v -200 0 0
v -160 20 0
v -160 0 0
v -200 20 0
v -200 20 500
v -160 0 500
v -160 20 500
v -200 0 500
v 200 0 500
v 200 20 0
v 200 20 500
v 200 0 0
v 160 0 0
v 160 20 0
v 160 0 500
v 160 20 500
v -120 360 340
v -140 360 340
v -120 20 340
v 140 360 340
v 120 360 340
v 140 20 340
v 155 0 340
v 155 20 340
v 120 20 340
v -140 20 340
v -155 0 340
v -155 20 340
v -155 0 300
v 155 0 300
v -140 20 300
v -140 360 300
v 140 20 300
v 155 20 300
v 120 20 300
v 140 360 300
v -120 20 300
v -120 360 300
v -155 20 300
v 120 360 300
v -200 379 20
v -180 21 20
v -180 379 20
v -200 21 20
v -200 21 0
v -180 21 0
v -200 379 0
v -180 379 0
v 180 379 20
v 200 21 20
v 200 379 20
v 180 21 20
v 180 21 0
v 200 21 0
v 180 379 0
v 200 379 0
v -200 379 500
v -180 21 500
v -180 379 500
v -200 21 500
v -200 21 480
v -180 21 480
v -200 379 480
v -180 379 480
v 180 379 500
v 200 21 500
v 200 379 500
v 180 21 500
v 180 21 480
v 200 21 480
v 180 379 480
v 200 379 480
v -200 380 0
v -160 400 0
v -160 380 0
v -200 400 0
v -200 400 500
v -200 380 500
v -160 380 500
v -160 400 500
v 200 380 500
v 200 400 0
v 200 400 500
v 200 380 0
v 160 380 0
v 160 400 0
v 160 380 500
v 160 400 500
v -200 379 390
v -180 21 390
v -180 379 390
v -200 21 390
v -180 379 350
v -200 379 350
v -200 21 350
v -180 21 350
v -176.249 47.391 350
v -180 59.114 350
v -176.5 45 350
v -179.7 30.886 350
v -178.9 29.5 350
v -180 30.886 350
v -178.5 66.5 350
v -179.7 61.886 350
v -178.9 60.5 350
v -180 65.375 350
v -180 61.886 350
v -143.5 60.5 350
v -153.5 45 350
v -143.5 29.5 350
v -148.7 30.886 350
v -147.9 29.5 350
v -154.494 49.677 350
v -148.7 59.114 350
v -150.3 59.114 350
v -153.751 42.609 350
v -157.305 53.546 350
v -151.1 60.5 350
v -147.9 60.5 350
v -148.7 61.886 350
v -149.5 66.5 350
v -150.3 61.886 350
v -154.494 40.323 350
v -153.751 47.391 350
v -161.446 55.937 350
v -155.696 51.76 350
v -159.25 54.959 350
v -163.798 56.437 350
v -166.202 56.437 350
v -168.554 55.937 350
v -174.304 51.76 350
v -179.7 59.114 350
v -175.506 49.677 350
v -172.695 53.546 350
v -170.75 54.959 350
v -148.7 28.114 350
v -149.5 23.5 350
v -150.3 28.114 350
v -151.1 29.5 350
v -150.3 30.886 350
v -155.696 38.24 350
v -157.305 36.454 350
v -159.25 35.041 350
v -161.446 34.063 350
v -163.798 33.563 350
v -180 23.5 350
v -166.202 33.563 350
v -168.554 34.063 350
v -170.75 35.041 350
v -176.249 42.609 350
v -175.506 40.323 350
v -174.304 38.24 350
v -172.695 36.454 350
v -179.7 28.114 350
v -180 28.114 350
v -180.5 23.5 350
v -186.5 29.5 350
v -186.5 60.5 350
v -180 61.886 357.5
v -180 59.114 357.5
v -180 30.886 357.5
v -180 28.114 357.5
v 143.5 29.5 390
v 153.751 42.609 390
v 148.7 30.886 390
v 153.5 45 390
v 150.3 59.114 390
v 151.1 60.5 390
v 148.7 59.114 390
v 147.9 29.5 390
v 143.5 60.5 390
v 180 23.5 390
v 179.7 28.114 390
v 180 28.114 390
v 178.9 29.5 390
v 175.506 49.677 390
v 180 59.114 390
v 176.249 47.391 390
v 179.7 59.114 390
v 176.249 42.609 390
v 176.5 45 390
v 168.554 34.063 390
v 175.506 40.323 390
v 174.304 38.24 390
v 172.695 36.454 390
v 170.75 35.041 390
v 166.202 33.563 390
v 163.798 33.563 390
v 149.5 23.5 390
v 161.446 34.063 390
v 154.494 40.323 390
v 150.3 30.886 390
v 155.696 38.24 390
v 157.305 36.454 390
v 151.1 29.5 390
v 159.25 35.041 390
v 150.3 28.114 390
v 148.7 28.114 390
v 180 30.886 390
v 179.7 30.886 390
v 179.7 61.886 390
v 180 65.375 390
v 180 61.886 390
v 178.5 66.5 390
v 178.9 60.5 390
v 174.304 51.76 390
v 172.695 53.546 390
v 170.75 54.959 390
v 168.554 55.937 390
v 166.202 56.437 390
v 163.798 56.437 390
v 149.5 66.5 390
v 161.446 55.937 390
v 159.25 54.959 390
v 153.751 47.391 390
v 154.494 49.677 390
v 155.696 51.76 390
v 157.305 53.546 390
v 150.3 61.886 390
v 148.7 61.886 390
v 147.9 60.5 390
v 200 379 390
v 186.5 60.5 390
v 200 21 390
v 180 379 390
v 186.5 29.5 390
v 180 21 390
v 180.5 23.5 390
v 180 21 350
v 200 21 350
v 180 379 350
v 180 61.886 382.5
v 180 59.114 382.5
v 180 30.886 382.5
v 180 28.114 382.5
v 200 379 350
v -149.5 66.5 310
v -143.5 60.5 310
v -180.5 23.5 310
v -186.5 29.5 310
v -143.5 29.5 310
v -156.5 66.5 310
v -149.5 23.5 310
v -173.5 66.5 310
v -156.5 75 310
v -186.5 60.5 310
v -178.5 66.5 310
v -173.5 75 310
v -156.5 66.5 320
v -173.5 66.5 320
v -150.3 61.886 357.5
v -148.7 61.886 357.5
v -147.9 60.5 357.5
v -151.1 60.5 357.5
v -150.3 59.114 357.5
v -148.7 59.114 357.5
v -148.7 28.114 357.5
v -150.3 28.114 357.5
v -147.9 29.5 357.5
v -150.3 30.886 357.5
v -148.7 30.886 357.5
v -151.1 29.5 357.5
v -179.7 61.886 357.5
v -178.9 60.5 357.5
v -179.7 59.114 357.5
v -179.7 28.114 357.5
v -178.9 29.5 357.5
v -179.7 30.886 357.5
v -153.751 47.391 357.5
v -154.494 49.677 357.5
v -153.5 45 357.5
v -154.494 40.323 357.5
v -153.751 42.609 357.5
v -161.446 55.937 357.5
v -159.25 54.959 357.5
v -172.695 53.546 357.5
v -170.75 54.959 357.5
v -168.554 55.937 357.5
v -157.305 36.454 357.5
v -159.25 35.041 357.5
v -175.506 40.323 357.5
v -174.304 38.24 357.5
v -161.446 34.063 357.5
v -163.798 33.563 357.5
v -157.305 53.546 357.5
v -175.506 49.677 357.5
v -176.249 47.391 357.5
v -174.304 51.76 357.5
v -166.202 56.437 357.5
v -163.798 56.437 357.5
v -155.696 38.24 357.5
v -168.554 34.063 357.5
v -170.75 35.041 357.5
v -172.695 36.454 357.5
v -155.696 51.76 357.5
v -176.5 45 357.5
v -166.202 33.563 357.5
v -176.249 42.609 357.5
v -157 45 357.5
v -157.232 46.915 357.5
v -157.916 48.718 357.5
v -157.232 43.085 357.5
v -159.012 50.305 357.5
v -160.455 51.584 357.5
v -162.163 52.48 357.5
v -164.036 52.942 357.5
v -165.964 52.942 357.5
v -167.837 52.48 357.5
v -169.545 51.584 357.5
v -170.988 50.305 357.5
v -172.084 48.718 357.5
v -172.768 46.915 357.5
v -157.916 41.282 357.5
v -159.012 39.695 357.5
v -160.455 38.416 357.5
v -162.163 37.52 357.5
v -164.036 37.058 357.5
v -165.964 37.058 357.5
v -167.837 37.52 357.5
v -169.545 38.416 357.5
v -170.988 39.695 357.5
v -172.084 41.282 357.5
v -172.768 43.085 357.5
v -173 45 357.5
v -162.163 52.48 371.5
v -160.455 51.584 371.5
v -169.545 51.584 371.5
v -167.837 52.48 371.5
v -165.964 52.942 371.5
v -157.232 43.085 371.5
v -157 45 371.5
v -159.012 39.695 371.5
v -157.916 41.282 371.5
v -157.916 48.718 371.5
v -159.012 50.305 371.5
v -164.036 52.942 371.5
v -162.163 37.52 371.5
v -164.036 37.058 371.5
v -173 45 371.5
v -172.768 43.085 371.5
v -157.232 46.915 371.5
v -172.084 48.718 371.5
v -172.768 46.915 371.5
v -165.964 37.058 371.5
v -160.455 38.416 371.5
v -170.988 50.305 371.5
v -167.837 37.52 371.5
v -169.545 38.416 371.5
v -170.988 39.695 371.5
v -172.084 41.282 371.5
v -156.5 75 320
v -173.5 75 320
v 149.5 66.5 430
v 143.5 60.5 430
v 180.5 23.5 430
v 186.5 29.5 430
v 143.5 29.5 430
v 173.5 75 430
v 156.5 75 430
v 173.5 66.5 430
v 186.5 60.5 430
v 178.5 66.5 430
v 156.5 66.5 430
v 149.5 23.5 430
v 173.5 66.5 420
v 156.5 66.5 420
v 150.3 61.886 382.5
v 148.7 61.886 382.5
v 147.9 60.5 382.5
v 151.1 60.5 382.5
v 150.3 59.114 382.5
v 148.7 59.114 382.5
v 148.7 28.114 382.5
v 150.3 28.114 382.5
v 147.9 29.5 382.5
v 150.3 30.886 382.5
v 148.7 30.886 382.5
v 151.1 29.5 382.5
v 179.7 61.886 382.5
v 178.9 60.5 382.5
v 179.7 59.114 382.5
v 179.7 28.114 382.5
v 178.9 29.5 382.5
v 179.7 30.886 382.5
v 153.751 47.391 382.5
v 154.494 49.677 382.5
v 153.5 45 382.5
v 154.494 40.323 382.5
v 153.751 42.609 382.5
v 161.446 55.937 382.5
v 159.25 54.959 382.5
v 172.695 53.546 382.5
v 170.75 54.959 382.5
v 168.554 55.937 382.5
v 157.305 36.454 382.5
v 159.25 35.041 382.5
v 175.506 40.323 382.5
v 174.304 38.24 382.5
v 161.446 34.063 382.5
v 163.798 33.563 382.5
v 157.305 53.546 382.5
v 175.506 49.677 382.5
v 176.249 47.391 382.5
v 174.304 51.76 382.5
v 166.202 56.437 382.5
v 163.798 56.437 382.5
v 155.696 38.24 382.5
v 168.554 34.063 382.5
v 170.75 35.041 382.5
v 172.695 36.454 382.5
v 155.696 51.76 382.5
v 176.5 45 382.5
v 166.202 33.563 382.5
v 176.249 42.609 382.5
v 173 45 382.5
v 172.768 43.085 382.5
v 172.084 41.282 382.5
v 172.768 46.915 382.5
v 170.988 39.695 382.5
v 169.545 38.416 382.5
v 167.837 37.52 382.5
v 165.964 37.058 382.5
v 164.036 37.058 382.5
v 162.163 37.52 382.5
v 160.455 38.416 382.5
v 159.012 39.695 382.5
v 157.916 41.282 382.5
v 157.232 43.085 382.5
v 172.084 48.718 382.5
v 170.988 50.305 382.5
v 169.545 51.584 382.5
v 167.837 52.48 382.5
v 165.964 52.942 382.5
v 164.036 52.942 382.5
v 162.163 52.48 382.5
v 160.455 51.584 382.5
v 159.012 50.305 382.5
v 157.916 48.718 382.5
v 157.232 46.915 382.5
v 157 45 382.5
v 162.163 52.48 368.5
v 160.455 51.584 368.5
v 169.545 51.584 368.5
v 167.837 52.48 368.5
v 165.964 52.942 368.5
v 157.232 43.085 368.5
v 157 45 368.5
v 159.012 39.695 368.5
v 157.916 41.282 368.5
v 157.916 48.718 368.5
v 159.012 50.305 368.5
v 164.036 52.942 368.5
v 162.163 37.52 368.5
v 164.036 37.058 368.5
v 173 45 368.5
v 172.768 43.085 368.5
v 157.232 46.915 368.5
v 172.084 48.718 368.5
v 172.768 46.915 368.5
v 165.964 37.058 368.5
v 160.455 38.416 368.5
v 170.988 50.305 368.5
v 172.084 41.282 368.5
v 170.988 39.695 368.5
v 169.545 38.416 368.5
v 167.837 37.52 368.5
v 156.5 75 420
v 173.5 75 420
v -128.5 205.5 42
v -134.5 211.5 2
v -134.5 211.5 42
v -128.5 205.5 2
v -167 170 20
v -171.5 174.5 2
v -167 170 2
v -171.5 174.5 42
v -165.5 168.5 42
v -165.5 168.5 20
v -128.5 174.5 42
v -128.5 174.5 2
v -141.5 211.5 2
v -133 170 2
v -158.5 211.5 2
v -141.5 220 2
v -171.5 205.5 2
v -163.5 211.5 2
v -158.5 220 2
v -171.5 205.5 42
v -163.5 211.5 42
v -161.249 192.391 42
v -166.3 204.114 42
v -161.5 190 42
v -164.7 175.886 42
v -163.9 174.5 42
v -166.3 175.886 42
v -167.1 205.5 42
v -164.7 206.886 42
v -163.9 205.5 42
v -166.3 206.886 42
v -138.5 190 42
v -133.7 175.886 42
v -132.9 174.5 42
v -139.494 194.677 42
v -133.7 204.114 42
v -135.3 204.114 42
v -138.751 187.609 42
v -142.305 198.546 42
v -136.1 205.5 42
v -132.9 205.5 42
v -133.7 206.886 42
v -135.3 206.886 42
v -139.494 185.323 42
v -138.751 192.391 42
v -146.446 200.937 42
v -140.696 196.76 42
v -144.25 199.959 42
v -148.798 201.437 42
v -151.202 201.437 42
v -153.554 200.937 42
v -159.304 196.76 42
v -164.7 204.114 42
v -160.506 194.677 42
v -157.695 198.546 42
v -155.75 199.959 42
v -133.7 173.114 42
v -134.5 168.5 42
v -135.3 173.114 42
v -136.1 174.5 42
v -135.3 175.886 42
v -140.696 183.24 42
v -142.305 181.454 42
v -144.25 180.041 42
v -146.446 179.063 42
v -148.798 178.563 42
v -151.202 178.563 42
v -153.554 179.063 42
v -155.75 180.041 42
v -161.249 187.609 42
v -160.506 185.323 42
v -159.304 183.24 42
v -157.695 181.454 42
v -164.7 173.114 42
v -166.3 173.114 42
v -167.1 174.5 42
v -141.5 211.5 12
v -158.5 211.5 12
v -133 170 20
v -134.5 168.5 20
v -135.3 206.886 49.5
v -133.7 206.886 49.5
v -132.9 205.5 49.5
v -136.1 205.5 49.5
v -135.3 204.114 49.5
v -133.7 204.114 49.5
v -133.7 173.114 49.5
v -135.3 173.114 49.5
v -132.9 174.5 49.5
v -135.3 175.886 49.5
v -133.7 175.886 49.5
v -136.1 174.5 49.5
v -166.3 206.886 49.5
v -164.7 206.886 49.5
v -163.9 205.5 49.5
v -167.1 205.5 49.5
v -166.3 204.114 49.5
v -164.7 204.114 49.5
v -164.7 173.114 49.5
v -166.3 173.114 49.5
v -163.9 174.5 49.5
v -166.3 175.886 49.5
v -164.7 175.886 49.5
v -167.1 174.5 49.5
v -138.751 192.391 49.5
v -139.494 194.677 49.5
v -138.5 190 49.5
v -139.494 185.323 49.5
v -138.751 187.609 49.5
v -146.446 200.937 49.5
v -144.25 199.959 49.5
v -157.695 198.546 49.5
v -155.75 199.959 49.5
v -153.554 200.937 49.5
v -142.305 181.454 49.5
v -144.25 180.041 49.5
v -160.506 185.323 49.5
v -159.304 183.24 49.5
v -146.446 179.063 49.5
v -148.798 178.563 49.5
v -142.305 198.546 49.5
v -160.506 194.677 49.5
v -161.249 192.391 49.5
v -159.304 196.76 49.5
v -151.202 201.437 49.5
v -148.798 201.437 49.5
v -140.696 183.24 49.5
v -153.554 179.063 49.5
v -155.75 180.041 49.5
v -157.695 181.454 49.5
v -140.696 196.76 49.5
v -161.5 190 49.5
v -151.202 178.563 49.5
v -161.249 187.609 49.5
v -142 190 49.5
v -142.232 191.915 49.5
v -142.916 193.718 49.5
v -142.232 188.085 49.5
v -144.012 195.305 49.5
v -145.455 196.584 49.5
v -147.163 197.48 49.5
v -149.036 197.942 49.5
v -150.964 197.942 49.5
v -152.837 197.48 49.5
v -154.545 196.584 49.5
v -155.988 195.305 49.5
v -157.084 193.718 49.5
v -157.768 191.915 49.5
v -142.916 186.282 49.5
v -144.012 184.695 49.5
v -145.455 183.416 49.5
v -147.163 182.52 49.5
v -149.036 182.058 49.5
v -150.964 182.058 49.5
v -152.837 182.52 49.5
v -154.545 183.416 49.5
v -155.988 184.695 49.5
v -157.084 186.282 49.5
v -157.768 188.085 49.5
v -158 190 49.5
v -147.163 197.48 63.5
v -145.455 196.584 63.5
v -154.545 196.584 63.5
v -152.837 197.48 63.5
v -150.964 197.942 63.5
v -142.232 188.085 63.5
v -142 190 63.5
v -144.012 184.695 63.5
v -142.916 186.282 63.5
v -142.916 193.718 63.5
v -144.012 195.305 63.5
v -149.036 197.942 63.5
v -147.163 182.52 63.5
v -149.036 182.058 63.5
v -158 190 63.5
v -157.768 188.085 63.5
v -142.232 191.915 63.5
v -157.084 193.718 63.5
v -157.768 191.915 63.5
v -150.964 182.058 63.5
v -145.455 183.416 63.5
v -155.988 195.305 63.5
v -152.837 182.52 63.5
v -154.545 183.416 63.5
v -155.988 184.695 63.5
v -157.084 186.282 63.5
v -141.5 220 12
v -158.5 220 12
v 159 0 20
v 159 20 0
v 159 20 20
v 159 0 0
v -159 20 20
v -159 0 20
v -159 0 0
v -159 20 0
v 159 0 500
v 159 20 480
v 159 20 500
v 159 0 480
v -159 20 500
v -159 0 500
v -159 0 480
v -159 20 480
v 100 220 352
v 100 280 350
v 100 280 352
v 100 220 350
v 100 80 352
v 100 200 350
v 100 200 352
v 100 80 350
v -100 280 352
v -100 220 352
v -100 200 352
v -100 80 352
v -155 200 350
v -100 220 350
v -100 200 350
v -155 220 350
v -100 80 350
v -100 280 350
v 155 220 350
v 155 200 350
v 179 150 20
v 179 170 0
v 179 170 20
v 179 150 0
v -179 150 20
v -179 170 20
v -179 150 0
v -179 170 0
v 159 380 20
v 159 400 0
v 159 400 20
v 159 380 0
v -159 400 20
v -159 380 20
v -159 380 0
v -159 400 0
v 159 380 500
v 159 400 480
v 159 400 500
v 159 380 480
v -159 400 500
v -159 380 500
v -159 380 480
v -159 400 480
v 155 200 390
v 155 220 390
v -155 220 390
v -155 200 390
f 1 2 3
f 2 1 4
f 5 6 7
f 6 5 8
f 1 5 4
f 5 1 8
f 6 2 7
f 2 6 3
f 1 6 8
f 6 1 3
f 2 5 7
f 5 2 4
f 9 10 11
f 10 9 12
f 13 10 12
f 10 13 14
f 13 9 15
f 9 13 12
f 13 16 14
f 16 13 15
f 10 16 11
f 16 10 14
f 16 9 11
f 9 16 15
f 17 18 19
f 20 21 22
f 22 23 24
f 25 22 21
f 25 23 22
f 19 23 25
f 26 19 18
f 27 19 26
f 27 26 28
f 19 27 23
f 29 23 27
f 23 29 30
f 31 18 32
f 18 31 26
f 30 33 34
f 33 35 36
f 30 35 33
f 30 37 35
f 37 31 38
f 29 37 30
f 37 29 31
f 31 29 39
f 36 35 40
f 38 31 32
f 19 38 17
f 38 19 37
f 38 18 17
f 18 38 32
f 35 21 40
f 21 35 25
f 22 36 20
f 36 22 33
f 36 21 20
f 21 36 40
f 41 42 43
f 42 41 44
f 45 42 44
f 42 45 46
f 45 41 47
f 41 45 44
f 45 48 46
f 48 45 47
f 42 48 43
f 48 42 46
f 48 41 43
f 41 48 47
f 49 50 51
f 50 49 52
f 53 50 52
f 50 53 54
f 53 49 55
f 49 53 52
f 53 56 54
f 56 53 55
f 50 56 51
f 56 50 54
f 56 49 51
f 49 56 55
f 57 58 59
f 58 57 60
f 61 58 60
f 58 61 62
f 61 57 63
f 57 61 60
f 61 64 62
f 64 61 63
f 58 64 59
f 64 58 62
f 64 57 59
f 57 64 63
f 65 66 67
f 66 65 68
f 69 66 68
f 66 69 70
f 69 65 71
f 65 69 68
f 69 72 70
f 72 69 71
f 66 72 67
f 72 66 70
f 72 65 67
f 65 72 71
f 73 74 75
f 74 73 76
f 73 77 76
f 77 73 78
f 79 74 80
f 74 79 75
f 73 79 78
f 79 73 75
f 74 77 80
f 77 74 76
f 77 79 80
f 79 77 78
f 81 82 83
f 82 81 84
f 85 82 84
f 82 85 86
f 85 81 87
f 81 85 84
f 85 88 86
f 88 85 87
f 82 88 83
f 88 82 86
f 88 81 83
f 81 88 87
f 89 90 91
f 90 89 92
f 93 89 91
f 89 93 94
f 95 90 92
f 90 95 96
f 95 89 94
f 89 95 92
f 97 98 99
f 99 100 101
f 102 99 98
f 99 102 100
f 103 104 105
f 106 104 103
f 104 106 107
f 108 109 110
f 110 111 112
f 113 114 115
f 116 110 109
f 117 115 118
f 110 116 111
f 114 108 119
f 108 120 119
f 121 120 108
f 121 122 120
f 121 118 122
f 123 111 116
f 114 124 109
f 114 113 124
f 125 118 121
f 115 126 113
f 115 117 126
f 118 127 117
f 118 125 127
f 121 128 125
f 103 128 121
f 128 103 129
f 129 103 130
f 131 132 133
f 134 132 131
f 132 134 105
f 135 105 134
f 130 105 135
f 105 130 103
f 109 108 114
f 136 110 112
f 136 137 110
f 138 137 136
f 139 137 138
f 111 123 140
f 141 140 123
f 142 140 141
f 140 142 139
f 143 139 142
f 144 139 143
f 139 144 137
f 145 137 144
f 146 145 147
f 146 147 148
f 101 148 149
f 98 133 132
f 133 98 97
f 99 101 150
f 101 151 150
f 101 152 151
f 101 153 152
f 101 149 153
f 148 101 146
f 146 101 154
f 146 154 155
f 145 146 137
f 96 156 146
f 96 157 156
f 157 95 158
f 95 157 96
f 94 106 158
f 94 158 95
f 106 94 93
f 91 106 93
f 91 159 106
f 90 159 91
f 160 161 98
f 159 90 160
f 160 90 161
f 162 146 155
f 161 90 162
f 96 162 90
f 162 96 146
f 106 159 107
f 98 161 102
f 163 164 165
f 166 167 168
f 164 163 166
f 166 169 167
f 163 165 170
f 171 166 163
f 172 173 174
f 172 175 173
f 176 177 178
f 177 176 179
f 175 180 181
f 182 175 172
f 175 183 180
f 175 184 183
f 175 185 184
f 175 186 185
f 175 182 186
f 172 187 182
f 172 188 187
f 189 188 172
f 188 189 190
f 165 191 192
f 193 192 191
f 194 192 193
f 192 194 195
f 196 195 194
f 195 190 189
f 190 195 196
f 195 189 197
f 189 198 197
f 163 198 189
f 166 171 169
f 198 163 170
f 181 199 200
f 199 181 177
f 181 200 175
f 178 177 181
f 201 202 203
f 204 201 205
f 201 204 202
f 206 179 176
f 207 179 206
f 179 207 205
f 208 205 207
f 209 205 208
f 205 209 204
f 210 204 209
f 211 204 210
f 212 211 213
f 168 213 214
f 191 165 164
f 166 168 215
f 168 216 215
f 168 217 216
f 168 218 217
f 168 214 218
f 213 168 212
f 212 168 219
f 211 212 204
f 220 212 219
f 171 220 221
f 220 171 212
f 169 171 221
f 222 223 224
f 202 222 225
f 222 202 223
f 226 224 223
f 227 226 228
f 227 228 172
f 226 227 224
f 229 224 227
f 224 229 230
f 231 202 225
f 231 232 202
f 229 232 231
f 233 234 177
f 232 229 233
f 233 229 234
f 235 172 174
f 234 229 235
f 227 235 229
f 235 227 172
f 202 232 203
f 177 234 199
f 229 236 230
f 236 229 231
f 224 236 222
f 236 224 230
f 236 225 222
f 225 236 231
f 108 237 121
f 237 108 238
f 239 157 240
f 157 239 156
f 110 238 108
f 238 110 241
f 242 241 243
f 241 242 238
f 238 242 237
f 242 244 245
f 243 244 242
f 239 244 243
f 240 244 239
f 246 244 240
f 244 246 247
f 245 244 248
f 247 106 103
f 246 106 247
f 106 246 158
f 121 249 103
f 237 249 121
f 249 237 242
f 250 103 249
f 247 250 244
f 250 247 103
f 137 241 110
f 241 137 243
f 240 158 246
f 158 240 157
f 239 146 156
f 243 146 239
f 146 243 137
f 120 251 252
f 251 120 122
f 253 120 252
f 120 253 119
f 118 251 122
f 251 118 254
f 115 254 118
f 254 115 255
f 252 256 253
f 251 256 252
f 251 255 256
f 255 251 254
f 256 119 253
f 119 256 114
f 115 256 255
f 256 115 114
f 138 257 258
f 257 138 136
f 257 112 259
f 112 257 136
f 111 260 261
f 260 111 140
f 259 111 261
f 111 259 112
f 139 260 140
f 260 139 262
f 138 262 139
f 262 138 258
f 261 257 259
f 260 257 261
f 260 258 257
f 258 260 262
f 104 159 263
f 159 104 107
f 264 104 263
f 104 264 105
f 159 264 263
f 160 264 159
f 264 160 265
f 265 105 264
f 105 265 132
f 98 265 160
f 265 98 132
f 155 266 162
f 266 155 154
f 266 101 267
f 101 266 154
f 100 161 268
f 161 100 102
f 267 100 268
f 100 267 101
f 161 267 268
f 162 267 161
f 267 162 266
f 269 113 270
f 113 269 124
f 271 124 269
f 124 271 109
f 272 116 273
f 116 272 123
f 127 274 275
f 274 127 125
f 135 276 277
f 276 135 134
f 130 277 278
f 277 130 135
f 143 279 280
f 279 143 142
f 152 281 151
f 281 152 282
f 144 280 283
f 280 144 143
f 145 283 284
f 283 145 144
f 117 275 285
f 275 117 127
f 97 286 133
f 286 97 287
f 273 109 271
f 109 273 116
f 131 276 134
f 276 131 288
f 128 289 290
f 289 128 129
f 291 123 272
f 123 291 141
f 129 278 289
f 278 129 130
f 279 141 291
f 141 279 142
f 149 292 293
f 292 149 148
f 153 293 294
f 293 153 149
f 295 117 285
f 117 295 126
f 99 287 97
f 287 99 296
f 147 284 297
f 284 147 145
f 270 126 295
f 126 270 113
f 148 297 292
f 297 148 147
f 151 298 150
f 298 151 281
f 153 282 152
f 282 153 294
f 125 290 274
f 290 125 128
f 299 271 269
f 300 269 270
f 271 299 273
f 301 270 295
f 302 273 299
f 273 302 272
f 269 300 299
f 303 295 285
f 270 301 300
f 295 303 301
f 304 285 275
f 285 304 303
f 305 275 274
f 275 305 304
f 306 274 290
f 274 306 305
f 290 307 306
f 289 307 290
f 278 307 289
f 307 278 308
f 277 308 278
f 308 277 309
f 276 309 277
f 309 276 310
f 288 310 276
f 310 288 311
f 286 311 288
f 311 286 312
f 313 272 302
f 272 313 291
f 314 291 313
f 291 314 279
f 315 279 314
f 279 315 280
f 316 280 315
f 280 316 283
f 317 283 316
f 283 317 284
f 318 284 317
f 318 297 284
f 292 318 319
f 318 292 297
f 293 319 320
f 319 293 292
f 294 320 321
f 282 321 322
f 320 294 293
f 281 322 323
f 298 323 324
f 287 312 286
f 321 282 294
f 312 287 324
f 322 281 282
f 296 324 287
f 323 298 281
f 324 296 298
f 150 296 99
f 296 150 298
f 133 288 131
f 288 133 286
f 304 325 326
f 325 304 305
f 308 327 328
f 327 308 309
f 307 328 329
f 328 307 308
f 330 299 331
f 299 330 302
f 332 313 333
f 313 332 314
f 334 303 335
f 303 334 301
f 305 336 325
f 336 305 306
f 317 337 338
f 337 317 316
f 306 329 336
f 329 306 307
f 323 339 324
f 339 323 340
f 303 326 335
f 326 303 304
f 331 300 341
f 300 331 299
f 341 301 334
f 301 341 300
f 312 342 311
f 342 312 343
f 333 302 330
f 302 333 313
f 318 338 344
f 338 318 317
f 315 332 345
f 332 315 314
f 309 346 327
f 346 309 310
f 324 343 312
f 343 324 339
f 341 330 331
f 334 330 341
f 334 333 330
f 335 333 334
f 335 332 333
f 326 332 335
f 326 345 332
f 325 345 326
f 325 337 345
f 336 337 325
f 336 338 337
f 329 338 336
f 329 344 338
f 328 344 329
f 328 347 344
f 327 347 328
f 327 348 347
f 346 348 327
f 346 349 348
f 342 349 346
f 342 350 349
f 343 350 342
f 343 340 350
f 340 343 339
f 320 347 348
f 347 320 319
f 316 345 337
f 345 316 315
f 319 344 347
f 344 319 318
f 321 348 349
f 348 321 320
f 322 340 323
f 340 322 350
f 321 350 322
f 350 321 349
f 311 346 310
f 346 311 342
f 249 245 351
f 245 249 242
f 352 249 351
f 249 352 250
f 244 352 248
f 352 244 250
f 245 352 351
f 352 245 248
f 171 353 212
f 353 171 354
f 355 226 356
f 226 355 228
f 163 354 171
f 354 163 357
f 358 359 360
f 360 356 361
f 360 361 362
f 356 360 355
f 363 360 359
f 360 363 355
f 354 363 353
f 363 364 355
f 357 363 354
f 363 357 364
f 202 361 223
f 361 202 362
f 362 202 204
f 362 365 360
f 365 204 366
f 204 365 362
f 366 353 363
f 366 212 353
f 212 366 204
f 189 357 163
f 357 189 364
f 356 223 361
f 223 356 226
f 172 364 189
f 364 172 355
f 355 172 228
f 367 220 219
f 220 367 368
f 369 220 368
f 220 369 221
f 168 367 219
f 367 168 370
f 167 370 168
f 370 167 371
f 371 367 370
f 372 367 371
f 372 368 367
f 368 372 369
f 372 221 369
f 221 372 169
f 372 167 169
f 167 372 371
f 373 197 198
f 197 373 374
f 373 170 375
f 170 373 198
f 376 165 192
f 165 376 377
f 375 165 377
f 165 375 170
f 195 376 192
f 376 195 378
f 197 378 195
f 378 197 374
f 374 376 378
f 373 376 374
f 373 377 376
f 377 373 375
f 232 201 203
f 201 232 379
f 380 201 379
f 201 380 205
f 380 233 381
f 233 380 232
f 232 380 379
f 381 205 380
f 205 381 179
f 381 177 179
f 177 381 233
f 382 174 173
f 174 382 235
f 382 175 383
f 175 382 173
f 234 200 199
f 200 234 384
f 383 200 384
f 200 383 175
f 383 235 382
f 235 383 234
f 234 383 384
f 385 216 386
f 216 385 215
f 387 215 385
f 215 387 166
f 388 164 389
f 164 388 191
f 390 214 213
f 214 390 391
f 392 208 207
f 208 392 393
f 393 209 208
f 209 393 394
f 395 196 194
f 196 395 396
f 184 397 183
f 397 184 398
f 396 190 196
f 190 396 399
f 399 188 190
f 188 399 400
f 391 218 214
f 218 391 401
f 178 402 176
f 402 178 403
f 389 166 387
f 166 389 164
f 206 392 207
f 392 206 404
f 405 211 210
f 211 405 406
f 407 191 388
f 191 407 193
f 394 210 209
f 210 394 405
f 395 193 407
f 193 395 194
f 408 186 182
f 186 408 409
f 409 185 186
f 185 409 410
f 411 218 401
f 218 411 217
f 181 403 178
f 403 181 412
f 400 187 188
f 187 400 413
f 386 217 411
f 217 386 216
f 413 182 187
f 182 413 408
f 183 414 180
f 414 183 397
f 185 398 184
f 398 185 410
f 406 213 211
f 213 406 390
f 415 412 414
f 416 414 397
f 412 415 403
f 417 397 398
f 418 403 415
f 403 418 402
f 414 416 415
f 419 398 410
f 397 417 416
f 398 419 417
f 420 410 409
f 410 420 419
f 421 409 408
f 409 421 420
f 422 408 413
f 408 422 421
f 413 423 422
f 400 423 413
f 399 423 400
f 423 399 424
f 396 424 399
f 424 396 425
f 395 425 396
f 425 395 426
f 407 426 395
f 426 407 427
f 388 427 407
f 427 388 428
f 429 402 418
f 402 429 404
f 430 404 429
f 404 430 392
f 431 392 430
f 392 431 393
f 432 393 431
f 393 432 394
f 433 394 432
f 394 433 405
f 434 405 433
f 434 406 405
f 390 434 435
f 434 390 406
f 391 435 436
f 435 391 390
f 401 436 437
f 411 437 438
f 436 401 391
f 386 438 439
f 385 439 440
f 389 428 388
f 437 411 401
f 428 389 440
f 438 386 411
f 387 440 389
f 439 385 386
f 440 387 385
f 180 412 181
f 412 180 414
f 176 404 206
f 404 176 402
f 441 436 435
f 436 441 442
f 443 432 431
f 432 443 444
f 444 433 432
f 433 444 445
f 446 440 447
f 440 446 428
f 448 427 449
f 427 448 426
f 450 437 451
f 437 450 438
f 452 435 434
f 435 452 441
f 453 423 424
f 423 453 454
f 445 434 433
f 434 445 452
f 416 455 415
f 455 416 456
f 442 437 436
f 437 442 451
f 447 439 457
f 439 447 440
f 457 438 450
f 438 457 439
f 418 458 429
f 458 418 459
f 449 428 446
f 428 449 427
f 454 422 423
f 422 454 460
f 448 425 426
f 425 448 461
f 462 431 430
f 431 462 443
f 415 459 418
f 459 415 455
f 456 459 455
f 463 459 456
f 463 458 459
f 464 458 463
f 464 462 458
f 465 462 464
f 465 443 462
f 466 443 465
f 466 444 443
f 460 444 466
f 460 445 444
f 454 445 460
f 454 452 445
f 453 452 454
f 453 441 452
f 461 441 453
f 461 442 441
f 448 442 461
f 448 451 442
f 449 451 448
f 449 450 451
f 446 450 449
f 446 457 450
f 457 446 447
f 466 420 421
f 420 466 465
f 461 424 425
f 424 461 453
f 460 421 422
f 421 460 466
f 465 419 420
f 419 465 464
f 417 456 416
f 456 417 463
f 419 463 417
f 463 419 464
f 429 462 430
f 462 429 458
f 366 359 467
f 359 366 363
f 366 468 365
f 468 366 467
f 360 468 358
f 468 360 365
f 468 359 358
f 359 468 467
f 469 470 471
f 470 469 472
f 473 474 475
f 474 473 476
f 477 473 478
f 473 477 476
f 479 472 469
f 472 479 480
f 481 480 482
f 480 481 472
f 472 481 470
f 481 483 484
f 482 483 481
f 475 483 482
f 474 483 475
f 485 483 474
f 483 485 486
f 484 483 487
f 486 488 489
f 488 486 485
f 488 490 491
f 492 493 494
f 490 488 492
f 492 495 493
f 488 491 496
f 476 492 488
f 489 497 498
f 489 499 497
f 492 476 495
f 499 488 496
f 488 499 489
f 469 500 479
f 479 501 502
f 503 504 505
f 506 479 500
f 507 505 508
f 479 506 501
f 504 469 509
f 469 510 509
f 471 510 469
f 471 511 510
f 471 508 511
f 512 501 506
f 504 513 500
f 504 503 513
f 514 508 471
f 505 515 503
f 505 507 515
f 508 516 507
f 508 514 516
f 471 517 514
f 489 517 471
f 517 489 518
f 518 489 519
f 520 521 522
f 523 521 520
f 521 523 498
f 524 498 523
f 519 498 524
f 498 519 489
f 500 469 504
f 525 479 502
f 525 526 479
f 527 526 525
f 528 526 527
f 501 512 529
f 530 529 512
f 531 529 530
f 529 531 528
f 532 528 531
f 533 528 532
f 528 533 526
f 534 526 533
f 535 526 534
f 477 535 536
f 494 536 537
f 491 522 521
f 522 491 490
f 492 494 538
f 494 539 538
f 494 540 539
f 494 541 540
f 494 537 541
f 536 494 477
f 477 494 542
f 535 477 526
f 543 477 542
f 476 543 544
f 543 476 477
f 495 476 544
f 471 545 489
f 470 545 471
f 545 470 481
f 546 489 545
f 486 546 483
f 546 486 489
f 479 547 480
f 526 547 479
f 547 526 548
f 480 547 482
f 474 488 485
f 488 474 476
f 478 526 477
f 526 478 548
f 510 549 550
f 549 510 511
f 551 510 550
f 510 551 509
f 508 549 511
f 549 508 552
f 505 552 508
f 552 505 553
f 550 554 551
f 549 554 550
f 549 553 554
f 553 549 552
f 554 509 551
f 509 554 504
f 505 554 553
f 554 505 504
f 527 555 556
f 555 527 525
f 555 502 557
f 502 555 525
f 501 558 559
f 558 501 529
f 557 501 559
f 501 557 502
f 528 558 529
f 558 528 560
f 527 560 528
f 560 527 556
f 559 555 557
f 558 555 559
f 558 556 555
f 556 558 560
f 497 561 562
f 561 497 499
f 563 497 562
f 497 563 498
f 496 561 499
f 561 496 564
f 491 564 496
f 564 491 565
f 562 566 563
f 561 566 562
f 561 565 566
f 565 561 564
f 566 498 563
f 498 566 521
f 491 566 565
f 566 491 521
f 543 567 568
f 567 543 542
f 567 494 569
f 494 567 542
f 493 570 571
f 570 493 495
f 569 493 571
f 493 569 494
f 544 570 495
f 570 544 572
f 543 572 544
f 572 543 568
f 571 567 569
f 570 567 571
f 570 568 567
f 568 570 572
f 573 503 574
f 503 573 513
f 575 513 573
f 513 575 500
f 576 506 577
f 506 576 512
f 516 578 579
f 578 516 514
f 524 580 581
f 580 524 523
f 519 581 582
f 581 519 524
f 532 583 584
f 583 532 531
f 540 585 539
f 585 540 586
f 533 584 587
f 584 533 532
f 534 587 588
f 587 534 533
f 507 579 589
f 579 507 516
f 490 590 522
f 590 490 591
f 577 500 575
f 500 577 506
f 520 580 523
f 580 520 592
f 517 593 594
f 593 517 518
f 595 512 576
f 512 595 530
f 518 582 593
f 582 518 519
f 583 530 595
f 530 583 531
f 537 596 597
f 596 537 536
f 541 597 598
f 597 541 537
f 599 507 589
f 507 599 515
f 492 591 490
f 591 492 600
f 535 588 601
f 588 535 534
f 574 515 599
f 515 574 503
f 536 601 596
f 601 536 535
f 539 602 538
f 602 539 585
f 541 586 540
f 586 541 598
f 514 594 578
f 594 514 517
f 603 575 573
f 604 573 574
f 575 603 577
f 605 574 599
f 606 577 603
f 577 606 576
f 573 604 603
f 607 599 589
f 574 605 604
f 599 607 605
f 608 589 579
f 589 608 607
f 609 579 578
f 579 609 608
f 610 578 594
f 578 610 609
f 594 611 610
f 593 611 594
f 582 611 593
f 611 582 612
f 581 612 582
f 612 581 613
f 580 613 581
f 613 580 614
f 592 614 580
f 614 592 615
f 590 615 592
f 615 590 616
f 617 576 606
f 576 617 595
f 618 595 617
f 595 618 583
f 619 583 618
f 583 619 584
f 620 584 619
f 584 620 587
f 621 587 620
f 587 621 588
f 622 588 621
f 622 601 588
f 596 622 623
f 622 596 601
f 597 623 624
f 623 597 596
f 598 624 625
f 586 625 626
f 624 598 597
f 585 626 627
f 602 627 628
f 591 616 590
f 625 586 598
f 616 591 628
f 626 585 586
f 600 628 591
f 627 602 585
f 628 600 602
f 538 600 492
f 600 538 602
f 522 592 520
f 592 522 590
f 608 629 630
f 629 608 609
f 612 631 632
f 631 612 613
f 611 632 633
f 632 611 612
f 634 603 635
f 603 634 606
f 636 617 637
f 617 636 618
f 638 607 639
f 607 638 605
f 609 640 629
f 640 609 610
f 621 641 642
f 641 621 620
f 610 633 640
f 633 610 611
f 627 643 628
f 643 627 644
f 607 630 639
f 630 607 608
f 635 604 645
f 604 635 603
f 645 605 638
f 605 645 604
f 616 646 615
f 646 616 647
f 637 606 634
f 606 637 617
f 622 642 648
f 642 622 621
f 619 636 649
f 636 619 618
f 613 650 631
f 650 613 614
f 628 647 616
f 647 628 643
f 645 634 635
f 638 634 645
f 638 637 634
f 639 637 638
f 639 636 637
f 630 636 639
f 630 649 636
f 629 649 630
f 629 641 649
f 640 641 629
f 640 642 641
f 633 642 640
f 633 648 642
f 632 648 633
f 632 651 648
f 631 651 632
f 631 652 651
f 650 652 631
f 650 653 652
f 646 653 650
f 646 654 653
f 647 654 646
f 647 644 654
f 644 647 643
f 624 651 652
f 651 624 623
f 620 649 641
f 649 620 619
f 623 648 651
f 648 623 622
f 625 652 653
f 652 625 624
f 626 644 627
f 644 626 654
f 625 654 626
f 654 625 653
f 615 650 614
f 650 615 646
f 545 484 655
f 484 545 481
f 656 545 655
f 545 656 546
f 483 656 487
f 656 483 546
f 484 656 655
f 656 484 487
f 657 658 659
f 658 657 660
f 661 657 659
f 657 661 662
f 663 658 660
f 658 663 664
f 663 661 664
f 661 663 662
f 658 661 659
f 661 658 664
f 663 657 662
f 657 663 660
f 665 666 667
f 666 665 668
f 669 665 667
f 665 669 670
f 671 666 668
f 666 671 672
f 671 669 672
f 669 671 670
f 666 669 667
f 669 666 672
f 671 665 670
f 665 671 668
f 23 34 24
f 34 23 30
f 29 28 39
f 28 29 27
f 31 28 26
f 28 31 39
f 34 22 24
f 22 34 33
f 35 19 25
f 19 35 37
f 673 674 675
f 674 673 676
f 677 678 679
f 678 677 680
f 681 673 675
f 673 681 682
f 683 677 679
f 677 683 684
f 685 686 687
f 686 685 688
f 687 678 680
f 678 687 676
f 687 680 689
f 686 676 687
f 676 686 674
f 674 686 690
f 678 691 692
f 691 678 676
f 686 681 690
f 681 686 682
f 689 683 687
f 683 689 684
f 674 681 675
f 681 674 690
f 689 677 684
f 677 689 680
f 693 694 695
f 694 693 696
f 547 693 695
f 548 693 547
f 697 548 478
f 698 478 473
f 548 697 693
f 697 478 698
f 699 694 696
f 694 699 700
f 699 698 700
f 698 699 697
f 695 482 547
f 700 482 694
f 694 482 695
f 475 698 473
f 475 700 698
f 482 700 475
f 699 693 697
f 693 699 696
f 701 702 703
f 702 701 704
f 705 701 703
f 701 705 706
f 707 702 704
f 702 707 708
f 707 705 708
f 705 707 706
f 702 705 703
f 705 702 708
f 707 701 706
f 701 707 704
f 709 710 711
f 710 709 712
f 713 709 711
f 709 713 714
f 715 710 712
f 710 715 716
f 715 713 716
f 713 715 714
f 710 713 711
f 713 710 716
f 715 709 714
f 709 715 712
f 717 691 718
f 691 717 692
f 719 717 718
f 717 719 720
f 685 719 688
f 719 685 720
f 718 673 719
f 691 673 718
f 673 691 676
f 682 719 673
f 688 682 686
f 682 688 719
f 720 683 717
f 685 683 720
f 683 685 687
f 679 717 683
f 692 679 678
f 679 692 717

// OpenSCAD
/*include <config.scad>
include <inc/jhead.scad>
use <other/fan_head.scad>*/

r3 = 3.2/2;
nema17_r_vis = 15.5;
nema17_r_centre = 11.5;
nema17_h_centre = 2;
nema17_h = 43;
nema17_l = 40;

module nema17_2d(){
    nema17_l = 43;
    nema17_h = 6;
    polygon([[0,nema17_h], [nema17_h,0]
            , [nema17_l-nema17_h,0],[nema17_l,nema17_h]
            , [nema17_l,nema17_l-nema17_h],[nema17_l-nema17_h,nema17_l]
            , [8,nema17_l],[0,nema17_l-nema17_h] ]);
}

module nema17_2d2(){
    translate([nema17_r_vis, nema17_r_vis] ) circle(r3_2d);
    translate([nema17_r_vis, -nema17_r_vis] ) circle(r3_2d);
    translate([-nema17_r_vis, nema17_r_vis] ) circle(r3_2d);
    translate([-nema17_r_vis, -nema17_r_vis] ) circle(r3_2d);
    circle(nema17_r_centre);
}


module nema17(){
    translate([-nema17_h/2, -nema17_h/2, -nema17_l/2] ) linear_extrude(nema17_l) nema17_2d();
    
    h = nema17_h/2+6;
    translate([nema17_r_vis, nema17_r_vis, 0] )rotate([0, 0, 0]) cylinder(h, r = r3);
    translate([nema17_r_vis, -nema17_r_vis, 0] )rotate([0, 0, 0]) cylinder(h, r = r3);
    translate([-nema17_r_vis, nema17_r_vis, 0] )rotate([0, 0, 0]) cylinder(h, r = r3);
    translate([-nema17_r_vis, -nema17_r_vis, 0] )rotate([0, 0, 0]) cylinder(h, r = r3);
    cylinder(h, nema17_r_centre, nema17_r_centre);
    cylinder(h+14, r = 8);
    
    translate([-8.5, 0, -nema17_l/2] ) cube([17,30, 10]);
}


plateau_l = 200;

printer_l = 400;
printer_lg = 400;
printer_h = 500;

plateau_h = 300;
corexy_h = 350;
corexy_y = 200;
module barre2020(l, center = false){
    echo("2020", l);
    if(center){
        color("gray") translate([-l/2, 0, 0]) cube([l, 20, 20]);
    } else {
        color("gray") cube([l, 20, 20]);
    }
}

module barre2040(l, center = false){
    echo(l);
    if(center){
        color("gray") translate([-l/2, 0, 0]) cube([l, 20, 40]);
    } else {
        color("gray") cube([l, 20, 40]);
    }
}

//arriere
barre2020(printer_l-82, true);
for(i=[0,1]){
    mirror([i,0,0])translate([-printer_l/2+40, 0,0])rotate([0,-90,0])barre2040(printer_h);
}
translate([0, 0, printer_h-20]) barre2020(printer_l-82, true);

//plateau
translate([-printer_l/2+45, 0,plateau_h])barre2040(printer_l-90);
for(i=[0,1]){
    mirror([i,0,0])translate([-printer_l/2+80, 0,plateau_h]) rotate([0,0,90]) barre2040(printer_lg-40);
}

translate([-plateau_l/2,80,50+plateau_h]) cube([plateau_l,plateau_l,2]);

//bas
for(i=[0,1]){
    mirror([i,0,0])translate([-printer_l/2+20,21,0]) rotate([0,0,90]) barre2020(printer_lg-42);
}
translate([0,150,0]) barre2020(printer_l-42, true);

//haut
for(i=[0,1]){
    mirror([i,0,0])translate([-printer_l/2+20,21,printer_h-20]) rotate([0,0,90]) barre2020(printer_lg-42);
}

//devant
translate([0,printer_lg-20,0])barre2020(printer_l-82, true);
for(i=[0,1]){
    mirror([i,0,0])translate([-printer_l/2+40, printer_lg-20,0])rotate([0,-90,0])barre2040(printer_h);
}
translate([0, printer_lg-20, printer_h-20]) barre2020(printer_l-82, true);


//corexy
translate([-printer_l/2+45, corexy_y,corexy_h])barre2040(printer_l-90);
for(i=[0,1]){
    mirror([i,0,0])translate([-printer_l/2+20, 21,corexy_h]) rotate([0,0,90]) barre2040(printer_lg-42);
}

for(i=[0,1]){
    translate([0,0,corexy_h+20])rotate([0,i*180,0]) translate([-printer_l/2+35,  45, -40])nema17();

}
translate([-printer_l/2+50,  190, 22])nema17();
